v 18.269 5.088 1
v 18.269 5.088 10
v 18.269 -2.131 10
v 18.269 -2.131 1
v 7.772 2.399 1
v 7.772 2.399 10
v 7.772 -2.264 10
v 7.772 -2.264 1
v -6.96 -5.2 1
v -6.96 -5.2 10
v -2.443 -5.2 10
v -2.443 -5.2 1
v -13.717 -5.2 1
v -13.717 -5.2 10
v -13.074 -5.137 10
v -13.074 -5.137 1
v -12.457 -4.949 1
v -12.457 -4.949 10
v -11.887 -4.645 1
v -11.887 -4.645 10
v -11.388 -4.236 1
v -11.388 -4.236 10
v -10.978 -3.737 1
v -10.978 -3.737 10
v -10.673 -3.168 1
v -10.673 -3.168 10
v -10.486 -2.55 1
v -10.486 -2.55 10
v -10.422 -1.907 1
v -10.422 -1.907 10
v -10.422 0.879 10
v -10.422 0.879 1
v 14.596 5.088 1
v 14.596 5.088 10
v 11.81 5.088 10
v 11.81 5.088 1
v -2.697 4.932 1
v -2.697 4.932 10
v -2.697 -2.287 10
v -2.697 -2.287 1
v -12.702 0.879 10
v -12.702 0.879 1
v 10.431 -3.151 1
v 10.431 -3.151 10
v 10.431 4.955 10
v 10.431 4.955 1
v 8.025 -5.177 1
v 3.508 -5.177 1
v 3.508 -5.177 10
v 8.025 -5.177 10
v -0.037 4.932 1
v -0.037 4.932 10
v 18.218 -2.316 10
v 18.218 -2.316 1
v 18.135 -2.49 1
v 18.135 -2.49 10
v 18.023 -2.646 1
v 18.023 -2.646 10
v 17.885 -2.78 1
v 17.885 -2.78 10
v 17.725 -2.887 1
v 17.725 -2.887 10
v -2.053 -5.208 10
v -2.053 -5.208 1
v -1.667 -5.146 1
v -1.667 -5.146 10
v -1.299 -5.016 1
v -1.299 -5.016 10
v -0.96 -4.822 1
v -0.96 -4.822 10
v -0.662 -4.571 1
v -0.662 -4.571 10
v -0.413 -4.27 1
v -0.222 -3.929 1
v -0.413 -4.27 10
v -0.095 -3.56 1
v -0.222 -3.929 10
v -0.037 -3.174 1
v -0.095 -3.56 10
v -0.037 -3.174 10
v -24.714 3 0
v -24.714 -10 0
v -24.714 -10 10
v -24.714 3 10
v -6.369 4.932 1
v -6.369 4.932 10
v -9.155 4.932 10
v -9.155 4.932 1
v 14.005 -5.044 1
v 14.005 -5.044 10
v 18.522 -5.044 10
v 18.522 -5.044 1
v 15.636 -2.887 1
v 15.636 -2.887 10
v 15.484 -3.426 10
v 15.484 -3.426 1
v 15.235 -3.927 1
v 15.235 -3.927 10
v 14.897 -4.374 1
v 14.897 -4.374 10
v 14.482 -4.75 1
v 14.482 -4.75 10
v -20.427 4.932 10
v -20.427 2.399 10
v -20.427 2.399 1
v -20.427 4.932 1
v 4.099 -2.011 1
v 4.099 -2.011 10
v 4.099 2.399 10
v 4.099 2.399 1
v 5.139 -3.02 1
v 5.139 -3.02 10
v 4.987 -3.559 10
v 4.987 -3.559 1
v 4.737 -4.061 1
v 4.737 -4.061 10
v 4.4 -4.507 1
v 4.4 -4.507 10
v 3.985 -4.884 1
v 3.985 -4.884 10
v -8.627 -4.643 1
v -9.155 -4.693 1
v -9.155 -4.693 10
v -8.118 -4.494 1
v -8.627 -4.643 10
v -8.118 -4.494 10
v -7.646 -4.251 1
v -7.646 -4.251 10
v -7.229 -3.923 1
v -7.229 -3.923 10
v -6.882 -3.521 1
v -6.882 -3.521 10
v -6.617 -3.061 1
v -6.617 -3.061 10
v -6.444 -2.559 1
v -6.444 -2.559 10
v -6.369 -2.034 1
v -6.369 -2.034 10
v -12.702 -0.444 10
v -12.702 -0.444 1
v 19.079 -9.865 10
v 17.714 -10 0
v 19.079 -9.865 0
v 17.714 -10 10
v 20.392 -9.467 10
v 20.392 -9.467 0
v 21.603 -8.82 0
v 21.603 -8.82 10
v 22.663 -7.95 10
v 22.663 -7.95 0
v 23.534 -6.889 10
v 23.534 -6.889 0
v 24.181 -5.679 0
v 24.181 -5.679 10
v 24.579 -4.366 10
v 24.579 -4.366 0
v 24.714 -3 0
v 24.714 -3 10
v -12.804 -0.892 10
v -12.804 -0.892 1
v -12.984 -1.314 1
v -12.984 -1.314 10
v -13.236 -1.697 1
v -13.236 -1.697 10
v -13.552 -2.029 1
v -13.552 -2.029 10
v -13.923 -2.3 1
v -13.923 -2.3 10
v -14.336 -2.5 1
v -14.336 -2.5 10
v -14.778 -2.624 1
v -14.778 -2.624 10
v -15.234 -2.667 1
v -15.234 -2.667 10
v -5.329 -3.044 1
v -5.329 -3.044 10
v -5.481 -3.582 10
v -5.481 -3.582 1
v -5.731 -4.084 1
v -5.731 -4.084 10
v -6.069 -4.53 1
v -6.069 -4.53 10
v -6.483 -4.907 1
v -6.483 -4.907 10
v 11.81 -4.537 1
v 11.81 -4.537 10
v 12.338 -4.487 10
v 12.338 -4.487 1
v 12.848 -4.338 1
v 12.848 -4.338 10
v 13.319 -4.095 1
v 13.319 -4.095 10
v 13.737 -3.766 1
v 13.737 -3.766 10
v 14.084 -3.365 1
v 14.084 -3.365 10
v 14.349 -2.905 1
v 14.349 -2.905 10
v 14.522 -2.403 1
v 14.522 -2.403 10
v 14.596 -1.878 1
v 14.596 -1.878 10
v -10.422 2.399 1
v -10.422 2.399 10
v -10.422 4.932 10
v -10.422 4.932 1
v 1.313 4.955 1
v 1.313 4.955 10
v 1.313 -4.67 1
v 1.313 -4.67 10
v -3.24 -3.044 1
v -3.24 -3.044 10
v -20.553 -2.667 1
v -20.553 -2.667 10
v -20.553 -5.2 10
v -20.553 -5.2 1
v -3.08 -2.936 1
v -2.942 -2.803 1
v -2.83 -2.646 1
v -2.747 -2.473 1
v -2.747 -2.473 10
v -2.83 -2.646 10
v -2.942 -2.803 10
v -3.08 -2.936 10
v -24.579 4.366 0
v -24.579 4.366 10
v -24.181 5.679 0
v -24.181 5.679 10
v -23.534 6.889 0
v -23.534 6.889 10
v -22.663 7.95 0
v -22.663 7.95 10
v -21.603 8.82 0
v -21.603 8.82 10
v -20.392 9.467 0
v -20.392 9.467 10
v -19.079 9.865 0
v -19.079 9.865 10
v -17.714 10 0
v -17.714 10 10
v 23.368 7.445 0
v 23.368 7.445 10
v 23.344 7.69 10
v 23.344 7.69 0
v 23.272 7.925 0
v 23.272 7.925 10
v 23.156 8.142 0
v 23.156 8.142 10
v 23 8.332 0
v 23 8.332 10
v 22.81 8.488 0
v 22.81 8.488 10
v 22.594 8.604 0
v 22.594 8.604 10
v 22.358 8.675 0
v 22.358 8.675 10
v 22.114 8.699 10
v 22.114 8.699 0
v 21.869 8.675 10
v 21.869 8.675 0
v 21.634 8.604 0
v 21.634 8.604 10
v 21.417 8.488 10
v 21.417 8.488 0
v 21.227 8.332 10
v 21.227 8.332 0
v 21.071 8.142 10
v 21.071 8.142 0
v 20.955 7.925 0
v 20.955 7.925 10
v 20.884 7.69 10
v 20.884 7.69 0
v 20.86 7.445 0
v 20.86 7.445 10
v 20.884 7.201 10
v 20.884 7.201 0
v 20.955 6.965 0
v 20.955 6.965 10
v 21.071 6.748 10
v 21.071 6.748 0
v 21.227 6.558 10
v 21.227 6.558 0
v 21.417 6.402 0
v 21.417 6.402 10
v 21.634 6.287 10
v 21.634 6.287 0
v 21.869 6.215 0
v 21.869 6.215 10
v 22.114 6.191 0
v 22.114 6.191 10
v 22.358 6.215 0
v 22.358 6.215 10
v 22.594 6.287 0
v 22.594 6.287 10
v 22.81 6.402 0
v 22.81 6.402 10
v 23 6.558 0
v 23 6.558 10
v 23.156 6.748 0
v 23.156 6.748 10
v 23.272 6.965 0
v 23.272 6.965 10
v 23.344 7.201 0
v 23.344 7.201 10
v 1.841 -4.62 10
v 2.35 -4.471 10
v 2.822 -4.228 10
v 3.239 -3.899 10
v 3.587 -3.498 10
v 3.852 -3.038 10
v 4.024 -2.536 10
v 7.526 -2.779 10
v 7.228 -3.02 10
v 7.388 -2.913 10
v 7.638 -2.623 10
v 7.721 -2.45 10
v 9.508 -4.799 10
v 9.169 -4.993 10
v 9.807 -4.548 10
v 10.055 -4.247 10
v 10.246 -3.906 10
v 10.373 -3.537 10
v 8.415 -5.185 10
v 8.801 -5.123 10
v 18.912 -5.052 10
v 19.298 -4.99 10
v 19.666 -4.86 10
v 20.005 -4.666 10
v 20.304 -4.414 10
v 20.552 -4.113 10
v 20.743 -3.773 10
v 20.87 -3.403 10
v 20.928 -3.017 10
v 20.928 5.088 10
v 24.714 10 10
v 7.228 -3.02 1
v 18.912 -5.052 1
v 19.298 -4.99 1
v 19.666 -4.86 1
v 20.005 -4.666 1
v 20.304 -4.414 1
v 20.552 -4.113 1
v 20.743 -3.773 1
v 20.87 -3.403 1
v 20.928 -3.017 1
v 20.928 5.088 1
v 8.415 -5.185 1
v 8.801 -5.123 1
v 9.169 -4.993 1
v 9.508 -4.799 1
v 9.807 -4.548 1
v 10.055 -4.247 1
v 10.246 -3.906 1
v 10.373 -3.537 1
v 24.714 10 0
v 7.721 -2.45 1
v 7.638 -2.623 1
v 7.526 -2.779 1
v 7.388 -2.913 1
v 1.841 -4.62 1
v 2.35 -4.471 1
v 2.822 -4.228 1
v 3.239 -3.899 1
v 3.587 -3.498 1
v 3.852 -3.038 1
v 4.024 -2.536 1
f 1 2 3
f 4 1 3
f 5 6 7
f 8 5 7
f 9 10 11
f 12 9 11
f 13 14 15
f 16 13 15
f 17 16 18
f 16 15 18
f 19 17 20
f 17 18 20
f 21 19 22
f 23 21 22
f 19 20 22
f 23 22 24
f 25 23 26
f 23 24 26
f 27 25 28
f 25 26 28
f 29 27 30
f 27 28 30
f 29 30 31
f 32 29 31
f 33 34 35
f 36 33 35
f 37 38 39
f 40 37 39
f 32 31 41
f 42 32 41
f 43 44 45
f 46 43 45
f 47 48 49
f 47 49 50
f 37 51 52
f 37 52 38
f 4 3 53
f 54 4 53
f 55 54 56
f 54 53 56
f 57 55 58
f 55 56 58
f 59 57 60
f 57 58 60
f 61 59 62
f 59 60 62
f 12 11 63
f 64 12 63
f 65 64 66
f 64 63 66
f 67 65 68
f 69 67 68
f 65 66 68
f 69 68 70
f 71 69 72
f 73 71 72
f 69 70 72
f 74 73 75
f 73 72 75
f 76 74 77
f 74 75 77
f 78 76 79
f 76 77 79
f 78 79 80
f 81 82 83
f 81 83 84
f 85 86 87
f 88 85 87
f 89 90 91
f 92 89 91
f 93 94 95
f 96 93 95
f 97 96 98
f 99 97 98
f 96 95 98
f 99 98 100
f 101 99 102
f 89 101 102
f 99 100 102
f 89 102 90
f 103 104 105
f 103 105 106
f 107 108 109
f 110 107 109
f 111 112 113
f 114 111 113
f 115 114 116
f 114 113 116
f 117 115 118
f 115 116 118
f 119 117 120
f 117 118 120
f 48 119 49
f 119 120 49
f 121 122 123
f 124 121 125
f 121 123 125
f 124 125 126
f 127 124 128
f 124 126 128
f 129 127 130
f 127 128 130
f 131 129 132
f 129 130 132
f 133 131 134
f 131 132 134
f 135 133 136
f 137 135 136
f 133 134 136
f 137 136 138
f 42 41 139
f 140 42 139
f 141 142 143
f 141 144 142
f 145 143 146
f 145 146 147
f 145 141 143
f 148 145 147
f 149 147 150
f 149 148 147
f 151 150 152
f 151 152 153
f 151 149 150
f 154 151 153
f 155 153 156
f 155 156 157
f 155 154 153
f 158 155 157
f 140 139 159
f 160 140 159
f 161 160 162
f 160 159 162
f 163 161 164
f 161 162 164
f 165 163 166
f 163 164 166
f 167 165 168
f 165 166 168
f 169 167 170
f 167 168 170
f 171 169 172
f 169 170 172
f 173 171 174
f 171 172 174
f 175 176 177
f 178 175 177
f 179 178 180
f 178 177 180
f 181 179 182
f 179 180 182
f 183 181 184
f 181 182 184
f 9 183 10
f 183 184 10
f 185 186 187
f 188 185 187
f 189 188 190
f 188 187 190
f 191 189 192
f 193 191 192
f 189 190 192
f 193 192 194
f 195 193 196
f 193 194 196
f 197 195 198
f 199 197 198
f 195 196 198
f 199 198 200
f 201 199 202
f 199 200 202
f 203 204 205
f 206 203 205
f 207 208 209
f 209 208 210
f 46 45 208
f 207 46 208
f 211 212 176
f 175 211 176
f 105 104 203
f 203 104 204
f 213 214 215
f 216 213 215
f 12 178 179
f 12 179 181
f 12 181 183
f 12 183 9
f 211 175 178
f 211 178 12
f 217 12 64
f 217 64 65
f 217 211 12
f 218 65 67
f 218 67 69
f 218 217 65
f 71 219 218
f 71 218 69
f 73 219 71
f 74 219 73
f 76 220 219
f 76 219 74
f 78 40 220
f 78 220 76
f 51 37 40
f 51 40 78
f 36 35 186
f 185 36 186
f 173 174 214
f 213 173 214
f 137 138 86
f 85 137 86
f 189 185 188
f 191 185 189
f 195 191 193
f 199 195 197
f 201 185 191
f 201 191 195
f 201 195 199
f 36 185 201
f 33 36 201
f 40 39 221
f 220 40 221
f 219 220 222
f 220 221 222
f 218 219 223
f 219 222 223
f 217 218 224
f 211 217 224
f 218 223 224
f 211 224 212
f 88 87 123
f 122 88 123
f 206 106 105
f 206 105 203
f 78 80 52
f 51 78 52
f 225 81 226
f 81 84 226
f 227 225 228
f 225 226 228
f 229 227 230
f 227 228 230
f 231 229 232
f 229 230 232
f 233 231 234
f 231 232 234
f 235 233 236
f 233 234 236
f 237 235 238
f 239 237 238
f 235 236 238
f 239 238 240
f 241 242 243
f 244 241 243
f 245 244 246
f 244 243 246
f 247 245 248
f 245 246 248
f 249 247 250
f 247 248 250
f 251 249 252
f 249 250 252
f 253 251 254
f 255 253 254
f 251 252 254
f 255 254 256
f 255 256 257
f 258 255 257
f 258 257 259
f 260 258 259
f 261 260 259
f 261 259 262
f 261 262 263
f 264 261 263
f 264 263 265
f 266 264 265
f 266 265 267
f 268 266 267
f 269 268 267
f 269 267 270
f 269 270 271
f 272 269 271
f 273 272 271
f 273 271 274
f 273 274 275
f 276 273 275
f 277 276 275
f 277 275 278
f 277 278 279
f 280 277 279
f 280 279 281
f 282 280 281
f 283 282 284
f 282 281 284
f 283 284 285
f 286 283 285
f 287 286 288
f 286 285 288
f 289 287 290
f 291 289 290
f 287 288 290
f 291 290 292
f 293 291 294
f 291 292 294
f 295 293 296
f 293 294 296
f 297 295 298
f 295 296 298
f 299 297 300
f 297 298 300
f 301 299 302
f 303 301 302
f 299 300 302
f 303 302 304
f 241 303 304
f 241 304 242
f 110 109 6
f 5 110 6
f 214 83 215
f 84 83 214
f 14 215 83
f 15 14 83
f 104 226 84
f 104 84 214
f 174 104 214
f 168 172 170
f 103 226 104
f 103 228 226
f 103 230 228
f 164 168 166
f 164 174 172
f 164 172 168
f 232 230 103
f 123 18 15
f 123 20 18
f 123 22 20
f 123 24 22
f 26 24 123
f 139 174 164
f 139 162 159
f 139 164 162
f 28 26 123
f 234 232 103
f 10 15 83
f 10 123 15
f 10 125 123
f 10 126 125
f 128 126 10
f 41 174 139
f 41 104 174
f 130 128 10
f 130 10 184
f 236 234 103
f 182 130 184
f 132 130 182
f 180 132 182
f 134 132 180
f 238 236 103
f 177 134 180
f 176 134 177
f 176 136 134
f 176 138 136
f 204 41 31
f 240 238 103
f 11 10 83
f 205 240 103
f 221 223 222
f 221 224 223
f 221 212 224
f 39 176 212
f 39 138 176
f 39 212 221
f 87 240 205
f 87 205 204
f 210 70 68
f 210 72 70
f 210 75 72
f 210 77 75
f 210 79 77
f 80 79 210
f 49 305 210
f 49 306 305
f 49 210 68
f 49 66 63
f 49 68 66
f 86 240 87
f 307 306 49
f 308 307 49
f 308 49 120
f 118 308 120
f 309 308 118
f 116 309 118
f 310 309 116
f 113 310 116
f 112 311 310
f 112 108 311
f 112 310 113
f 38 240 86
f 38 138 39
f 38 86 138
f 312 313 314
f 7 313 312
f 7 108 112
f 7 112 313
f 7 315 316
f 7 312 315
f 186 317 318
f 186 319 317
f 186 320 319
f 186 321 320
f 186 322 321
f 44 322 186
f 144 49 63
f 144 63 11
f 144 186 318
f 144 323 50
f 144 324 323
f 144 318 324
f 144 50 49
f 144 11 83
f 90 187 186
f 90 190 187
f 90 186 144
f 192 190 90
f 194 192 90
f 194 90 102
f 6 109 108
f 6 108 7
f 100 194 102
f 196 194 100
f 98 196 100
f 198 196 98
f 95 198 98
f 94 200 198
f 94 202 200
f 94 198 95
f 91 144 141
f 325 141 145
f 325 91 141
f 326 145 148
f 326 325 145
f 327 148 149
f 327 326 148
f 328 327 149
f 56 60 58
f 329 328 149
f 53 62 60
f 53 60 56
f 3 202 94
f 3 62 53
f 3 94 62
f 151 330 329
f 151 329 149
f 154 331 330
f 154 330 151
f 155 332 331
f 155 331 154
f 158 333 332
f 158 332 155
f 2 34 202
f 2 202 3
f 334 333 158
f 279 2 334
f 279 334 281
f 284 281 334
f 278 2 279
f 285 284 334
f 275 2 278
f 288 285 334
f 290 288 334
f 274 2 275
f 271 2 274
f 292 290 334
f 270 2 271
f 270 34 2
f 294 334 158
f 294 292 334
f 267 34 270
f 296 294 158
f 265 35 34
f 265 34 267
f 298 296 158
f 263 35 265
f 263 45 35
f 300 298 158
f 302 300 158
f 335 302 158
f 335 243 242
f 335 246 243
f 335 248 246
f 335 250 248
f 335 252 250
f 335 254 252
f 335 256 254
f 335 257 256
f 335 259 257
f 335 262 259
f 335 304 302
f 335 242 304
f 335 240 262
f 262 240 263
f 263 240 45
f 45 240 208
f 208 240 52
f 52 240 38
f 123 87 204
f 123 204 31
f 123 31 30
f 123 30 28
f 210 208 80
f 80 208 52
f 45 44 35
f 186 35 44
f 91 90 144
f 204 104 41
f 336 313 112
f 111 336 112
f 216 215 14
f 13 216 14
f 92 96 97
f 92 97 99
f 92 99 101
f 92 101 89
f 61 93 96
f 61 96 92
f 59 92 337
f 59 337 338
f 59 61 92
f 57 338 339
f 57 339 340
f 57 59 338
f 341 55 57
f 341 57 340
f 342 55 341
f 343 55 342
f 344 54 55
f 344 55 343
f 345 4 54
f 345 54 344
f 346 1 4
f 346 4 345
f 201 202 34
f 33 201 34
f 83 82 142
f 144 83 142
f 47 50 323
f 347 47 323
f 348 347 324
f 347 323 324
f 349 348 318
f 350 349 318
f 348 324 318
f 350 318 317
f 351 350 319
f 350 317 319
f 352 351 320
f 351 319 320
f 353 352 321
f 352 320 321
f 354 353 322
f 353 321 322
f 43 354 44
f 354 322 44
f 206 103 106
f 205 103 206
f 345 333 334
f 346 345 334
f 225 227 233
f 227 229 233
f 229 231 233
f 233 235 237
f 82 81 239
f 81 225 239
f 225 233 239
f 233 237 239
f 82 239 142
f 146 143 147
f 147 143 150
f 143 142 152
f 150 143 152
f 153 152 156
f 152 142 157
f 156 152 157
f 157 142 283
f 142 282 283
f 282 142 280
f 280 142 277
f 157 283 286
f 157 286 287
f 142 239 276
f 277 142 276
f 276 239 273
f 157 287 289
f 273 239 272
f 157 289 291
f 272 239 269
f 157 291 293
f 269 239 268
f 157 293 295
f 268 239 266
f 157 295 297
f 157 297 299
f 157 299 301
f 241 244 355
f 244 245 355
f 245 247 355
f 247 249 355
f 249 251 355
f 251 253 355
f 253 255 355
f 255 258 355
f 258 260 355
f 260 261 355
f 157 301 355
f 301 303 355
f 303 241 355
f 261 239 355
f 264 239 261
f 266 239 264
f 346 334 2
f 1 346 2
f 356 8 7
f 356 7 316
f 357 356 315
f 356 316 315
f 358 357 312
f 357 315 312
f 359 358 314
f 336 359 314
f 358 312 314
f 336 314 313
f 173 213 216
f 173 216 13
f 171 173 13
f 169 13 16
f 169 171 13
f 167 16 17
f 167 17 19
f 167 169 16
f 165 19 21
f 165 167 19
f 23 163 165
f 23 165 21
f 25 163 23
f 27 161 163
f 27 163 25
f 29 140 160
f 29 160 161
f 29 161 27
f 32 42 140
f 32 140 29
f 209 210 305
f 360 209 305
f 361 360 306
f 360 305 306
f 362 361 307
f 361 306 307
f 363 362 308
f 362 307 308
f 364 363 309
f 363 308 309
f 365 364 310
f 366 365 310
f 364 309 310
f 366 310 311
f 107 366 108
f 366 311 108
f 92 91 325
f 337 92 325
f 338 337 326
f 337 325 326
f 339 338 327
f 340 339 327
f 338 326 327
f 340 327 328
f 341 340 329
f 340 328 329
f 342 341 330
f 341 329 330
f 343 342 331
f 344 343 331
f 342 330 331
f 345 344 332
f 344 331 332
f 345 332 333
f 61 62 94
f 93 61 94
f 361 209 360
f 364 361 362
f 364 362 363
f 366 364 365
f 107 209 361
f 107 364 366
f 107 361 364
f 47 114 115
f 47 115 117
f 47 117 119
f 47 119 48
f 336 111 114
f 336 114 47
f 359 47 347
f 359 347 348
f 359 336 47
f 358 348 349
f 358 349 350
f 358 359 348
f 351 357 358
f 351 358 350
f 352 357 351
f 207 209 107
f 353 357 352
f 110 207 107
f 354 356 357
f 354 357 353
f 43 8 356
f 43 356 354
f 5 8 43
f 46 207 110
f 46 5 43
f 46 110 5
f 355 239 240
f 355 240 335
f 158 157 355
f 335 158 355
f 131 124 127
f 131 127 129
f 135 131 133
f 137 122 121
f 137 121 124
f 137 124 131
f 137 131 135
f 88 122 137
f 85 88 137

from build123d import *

# Parameters (mm, degrees)
F0_W     = 49.427262
F0_H     = 20
F1_DEPTH = 10
F2_W     = 10.004918
F2_H     = 2.53289
F3_DEPTH = 9
F4_R     = 7
F5_R     = 1.254098
F6_DEPTH = 10.001


with BuildPart() as f1:
    # F0 (on Top) → F1 (new body)
    with BuildSketch(Plane.XY):
        Rectangle(F0_W, F0_H)
    extrude(amount=F1_DEPTH)

    # F2 (on face) → F3 (cut)
    with BuildSketch(Plane.XY.offset(10)):
        with Locations((-15.424379, 3.665117)):
            Rectangle(F2_W, F2_H)
        with BuildLine():
            Line((-10.42192, 0.878937), (-12.701521, 0.878937))
            Line((-12.701521, 0.878937), (-12.701521, 0.245714))
            ThreePointArc((-12.701521, 0.245714), (-12.678233, -0.099326), (-12.701521, -0.444367))
            ThreePointArc((-12.701521, -0.444367), (-13.552341, -2.029358), (-15.234413, -2.66711))
            Line((-15.234413, -2.66711), (-20.553483, -2.66711))
            Line((-20.553483, -2.66711), (-20.553483, -5.2))
            Line((-20.553483, -5.2), (-13.717022, -5.2))
            ThreePointArc((-13.717022, -5.2), (-11.387862, -4.235716), (-10.42192, -1.907243))
            Line((-10.42192, -1.907243), (-10.42192, 0.878937))
        make_face()
        with BuildLine():
            ThreePointArc((-12.701521, -0.444367), (-12.678233, -0.099326), (-12.701521, 0.245714))
            Line((-12.701521, 0.245714), (-12.701521, -0.444367))
        make_face()
        with BuildLine():
            Line((-6.369294, 4.931562), (-9.155474, 4.931562))
            Line((-9.155474, 4.931562), (-9.155474, -4.693422))
            ThreePointArc((-9.155474, -4.693422), (-7.228804, -3.922643), (-6.369294, -2.033887))
            Line((-6.369294, -2.033887), (-6.369294, 4.931562))
        make_face()
        with BuildLine():
            Line((-0.037068, 4.931562), (-2.696603, 4.931562))
            Line((-2.696603, 4.931562), (-2.696603, -1.907243))
            ThreePointArc((-2.696603, -1.907243), (-2.679752, -2.097209), (-2.696603, -2.287176))
            ThreePointArc((-2.696603, -2.287176), (-2.882546, -2.726977), (-3.24005, -3.043506))
            ThreePointArc((-3.24005, -3.043506), (-3.759009, -3.176466), (-4.277969, -3.043506))
            Line((-4.277969, -3.043506), (-5.329138, -3.043506))
            ThreePointArc((-5.329138, -3.043506), (-5.889298, -4.314902), (-6.960199, -5.2))
            Line((-6.960199, -5.2), (-6.369294, -5.2))
            Line((-6.369294, -5.2), (-2.443314, -5.2))
            ThreePointArc((-2.443314, -5.2), (-0.805329, -4.703243), (-0.037068, -3.173688))
            Line((-0.037068, -3.173688), (-0.037068, 4.931562))
        make_face()
        with BuildLine():
            ThreePointArc((-2.696603, -2.287176), (-2.679752, -2.097209), (-2.696603, -1.907243))
            Line((-2.696603, -1.907243), (-2.696603, -2.287176))
        make_face()
        with BuildLine():
            ThreePointArc((-4.277969, -3.043506), (-3.759009, -3.176466), (-3.24005, -3.043506))
            Line((-3.24005, -3.043506), (-4.277969, -3.043506))
        make_face()
        with BuildLine():
            Line((4.09889, 4.95471), (1.31271, 4.95471))
            Line((1.31271, 4.95471), (1.31271, 2.398672))
            Line((1.31271, 2.398672), (1.31271, -4.670274))
            ThreePointArc((1.31271, -4.670274), (3.23938, -3.899495), (4.09889, -2.010739))
            Line((4.09889, -2.010739), (4.09889, 2.398672))
            Line((4.09889, 2.398672), (7.771581, 2.398672))
            Line((7.771581, 2.398672), (7.771581, -1.884095))
            ThreePointArc((7.771581, -1.884095), (7.788432, -2.074061), (7.771581, -2.264028))
            ThreePointArc((7.771581, -2.264028), (7.585638, -2.703829), (7.228134, -3.020358))
            ThreePointArc((7.228134, -3.020358), (6.709175, -3.153318), (6.190215, -3.020358))
            Line((6.190215, -3.020358), (5.139046, -3.020358))
            ThreePointArc((5.139046, -3.020358), (4.578886, -4.291754), (3.507985, -5.176852))
            Line((3.507985, -5.176852), (4.09889, -5.176852))
            Line((4.09889, -5.176852), (8.02487, -5.176852))
            ThreePointArc((8.02487, -5.176852), (9.662855, -4.680095), (10.431116, -3.15054))
            Line((10.431116, -3.15054), (10.431116, 2.398672))
            Line((10.431116, 2.398672), (10.431116, 4.95471))
            Line((10.431116, 4.95471), (7.771581, 4.95471))
            Line((7.771581, 4.95471), (4.09889, 4.95471))
        make_face()
        with BuildLine():
            ThreePointArc((7.771581, -2.264028), (7.788432, -2.074061), (7.771581, -1.884095))
            Line((7.771581, -1.884095), (7.771581, -2.264028))
        make_face()
        with BuildLine():
            ThreePointArc((6.190215, -3.020358), (6.709175, -3.153318), (7.228134, -3.020358))
            Line((7.228134, -3.020358), (6.190215, -3.020358))
        make_face()
        with BuildLine():
            Line((14.5961, 5.087933), (11.809921, 5.087933))
            Line((11.809921, 5.087933), (11.809921, -4.537051))
            ThreePointArc((11.809921, -4.537051), (13.73659, -3.766272), (14.5961, -1.877516))
            Line((14.5961, -1.877516), (14.5961, 5.087933))
        make_face()
        with BuildLine():
            Line((20.928327, 5.087933), (18.268792, 5.087933))
            Line((18.268792, 5.087933), (18.268792, -1.750871))
            ThreePointArc((18.268792, -1.750871), (18.285642, -1.940838), (18.268792, -2.130805))
            ThreePointArc((18.268792, -2.130805), (18.082849, -2.570606), (17.725345, -2.887134))
            ThreePointArc((17.725345, -2.887134), (17.206385, -3.020095), (16.687426, -2.887134))
            Line((16.687426, -2.887134), (15.636256, -2.887134))
            ThreePointArc((15.636256, -2.887134), (15.076097, -4.158531), (14.005196, -5.043629))
            Line((14.005196, -5.043629), (14.5961, -5.043629))
            Line((14.5961, -5.043629), (18.522081, -5.043629))
            ThreePointArc((18.522081, -5.043629), (20.160066, -4.546872), (20.928327, -3.017317))
            Line((20.928327, -3.017317), (20.928327, 5.087933))
        make_face()
        with BuildLine():
            ThreePointArc((18.268792, -2.130805), (18.285642, -1.940838), (18.268792, -1.750871))
            Line((18.268792, -1.750871), (18.268792, -2.130805))
        make_face()
        with BuildLine():
            ThreePointArc((16.687426, -2.887134), (17.206385, -3.020095), (17.725345, -2.887134))
            Line((17.725345, -2.887134), (16.687426, -2.887134))
        make_face()
    extrude(amount=-F3_DEPTH, mode=Mode.SUBTRACT)

    # F4
    f4_edges = [f1.edges().sort_by_distance(p)[0] for p in [
        (-24.713631, 10, 5),
        (24.713631, -10, 5),
    ]]
    fillet(f4_edges, radius=F4_R)

    # F5 (on face) → F6 (cut, through all)
    with BuildSketch(Plane.XY.offset(10)):
        with Locations((22.113672, 7.445175)):
            Circle(F5_R)
    extrude(amount=-F6_DEPTH, mode=Mode.SUBTRACT)


solid = f1.part
